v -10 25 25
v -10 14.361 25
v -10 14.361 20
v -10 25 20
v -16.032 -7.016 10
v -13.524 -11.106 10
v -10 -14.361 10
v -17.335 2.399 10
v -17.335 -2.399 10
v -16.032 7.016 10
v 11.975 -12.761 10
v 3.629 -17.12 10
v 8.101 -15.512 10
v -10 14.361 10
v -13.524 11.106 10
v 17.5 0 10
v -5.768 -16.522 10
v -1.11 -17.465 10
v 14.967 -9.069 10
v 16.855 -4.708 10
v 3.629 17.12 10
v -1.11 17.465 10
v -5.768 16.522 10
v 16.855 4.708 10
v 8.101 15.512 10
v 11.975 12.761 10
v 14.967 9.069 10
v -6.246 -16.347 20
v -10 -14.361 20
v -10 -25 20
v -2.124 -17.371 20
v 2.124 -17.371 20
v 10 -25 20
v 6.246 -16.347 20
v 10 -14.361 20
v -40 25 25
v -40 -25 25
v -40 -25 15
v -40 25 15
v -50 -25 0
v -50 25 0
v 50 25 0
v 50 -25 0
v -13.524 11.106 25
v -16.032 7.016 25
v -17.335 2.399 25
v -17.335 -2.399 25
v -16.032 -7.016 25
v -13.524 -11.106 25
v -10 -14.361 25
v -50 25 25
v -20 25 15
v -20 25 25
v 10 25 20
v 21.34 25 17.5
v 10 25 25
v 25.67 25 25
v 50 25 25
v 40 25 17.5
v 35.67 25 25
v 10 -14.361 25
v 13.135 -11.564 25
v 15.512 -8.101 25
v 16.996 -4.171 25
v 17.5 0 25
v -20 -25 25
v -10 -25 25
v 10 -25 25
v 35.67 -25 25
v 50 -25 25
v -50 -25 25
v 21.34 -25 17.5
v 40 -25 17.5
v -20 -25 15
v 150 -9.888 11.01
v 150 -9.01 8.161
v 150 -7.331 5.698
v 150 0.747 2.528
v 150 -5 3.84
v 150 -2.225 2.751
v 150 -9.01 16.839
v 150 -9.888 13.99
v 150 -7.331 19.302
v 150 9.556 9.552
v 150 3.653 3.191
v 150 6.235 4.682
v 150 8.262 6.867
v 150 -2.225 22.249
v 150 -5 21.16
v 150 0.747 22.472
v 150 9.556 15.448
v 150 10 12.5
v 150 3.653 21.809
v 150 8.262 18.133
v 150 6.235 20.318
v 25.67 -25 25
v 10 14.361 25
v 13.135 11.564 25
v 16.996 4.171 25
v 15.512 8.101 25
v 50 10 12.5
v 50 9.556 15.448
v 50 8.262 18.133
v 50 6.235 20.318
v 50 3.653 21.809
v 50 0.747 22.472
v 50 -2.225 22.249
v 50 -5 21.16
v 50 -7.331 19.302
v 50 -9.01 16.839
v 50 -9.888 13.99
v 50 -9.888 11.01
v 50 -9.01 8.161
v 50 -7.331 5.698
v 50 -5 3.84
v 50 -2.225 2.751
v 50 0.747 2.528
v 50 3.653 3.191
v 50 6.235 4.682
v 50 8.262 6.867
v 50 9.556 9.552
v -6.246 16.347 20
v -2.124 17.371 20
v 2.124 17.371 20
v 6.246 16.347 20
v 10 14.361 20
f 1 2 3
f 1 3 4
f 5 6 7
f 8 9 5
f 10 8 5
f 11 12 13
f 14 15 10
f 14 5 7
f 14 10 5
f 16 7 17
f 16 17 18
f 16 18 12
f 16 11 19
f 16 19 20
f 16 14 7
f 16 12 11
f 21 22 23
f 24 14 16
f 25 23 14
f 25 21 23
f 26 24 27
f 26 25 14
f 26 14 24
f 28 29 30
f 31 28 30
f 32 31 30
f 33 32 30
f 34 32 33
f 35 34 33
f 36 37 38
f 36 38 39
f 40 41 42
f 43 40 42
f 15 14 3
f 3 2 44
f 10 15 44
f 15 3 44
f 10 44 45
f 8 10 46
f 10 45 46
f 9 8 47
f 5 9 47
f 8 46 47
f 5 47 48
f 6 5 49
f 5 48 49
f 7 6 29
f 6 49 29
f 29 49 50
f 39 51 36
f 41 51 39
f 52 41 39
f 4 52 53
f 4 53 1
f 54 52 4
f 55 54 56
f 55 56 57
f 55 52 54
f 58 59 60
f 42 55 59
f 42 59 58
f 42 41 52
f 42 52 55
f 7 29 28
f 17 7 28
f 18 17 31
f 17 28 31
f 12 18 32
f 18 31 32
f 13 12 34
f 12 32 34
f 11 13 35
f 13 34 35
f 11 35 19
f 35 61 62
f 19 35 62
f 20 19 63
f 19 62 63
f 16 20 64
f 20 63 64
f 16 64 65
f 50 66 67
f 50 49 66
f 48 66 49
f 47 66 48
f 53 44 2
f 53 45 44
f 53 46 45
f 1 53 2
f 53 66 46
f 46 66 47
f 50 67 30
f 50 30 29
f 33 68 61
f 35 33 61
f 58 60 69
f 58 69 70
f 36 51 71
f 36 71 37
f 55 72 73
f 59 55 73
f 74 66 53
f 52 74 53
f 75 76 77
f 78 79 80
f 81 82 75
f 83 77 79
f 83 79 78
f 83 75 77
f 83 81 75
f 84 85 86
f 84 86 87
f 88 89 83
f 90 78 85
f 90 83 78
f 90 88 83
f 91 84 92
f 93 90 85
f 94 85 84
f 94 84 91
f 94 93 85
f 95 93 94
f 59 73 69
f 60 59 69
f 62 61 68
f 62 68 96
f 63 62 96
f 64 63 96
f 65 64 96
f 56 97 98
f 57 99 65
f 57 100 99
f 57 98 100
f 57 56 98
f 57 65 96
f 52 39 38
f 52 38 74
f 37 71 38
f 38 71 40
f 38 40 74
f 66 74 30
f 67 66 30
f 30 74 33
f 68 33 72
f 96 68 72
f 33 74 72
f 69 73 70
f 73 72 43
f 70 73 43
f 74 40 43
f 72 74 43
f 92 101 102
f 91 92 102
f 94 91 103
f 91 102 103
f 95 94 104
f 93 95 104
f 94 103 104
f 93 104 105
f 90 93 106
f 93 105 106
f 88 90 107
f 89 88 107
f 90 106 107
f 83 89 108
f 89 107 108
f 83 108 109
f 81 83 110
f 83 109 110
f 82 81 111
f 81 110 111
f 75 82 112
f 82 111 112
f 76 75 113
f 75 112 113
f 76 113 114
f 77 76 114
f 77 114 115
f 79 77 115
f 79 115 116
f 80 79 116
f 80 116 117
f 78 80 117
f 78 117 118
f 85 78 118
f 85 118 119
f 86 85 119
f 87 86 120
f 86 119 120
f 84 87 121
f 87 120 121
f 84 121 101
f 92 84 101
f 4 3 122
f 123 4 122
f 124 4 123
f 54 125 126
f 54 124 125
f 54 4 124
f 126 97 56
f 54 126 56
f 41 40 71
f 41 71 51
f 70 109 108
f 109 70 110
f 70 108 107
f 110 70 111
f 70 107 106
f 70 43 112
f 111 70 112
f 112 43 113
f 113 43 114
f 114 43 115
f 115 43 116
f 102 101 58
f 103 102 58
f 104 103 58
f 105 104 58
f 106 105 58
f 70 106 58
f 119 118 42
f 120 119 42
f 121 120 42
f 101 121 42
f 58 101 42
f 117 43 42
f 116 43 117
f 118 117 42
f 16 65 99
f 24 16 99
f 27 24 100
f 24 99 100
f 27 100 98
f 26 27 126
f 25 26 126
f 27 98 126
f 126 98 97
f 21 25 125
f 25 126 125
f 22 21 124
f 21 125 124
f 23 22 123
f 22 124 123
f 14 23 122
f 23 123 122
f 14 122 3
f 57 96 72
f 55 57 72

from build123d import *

# Parameters (mm, degrees)
F0_W      = 100
F0_H      = 50
F1_DEPTH  = 25
F2_W      = 20
F2_H      = 50
F3_DEPTH  = 10
F4_DEPTH  = 5
F6_DEPTH  = 50
F7_R      = 10
F8_DEPTH  = 100
F10_DEPTH = 15


# Not quite as in the source:
# - a feature names something its author has since deleted; it is built from what else it names


with BuildPart() as f1:
    # F0 (on Top) → F1 (new body)
    with BuildSketch(Plane.XY):
        Rectangle(F0_W, F0_H)
    extrude(amount=F1_DEPTH)

    # F2 (on face) → F3 (cut)
    with BuildSketch(Plane.XY.offset(25)):
        with Locations((-30, 0)):
            Rectangle(F2_W, F2_H)
    extrude(amount=-F3_DEPTH, mode=Mode.SUBTRACT)

    # F2 (on face) → F4 (cut)
    with BuildSketch(Plane.XY.offset(25)):
        Rectangle(F2_W, F2_H)
    extrude(amount=-F4_DEPTH, mode=Mode.SUBTRACT)

    # F5 (on face) → F6 (cut, through all)
    with BuildSketch(Plane.XZ.offset(25)):
        Polygon((35.6698729811, 25), (25.6698729811, 25), (21.3397459622, 17.5), (40, 17.5), align=None)
    extrude(amount=-F6_DEPTH, mode=Mode.SUBTRACT)

    # F7 (on face) → F8 (join)
    with BuildSketch(Plane.YZ.offset(50)):
        with Locations((0, 12.5)):
            Circle(F7_R)
    extrude(amount=F8_DEPTH)

    # F9 (on face) → F10 (cut)
    with BuildSketch(Plane.XY.offset(25)):
        with BuildLine():
            ThreePointArc((-10, -14.3614066163), (8.100925873, -15.5120920575), (17.5, 0))
            ThreePointArc((17.5, 0), (8.100925873, 15.5120920575), (-10, 14.3614066163))
            Line((-10, 14.3614066163), (-10, -14.3614066163))
        make_face()
        with BuildLine():
            Line((-10, -14.3614066163), (-10, 14.3614066163))
            ThreePointArc((-10, 14.3614066163), (-17.5, 0), (-10, -14.3614066163))
        make_face()
    extrude(amount=-F10_DEPTH, mode=Mode.SUBTRACT)


solid = f1.part
